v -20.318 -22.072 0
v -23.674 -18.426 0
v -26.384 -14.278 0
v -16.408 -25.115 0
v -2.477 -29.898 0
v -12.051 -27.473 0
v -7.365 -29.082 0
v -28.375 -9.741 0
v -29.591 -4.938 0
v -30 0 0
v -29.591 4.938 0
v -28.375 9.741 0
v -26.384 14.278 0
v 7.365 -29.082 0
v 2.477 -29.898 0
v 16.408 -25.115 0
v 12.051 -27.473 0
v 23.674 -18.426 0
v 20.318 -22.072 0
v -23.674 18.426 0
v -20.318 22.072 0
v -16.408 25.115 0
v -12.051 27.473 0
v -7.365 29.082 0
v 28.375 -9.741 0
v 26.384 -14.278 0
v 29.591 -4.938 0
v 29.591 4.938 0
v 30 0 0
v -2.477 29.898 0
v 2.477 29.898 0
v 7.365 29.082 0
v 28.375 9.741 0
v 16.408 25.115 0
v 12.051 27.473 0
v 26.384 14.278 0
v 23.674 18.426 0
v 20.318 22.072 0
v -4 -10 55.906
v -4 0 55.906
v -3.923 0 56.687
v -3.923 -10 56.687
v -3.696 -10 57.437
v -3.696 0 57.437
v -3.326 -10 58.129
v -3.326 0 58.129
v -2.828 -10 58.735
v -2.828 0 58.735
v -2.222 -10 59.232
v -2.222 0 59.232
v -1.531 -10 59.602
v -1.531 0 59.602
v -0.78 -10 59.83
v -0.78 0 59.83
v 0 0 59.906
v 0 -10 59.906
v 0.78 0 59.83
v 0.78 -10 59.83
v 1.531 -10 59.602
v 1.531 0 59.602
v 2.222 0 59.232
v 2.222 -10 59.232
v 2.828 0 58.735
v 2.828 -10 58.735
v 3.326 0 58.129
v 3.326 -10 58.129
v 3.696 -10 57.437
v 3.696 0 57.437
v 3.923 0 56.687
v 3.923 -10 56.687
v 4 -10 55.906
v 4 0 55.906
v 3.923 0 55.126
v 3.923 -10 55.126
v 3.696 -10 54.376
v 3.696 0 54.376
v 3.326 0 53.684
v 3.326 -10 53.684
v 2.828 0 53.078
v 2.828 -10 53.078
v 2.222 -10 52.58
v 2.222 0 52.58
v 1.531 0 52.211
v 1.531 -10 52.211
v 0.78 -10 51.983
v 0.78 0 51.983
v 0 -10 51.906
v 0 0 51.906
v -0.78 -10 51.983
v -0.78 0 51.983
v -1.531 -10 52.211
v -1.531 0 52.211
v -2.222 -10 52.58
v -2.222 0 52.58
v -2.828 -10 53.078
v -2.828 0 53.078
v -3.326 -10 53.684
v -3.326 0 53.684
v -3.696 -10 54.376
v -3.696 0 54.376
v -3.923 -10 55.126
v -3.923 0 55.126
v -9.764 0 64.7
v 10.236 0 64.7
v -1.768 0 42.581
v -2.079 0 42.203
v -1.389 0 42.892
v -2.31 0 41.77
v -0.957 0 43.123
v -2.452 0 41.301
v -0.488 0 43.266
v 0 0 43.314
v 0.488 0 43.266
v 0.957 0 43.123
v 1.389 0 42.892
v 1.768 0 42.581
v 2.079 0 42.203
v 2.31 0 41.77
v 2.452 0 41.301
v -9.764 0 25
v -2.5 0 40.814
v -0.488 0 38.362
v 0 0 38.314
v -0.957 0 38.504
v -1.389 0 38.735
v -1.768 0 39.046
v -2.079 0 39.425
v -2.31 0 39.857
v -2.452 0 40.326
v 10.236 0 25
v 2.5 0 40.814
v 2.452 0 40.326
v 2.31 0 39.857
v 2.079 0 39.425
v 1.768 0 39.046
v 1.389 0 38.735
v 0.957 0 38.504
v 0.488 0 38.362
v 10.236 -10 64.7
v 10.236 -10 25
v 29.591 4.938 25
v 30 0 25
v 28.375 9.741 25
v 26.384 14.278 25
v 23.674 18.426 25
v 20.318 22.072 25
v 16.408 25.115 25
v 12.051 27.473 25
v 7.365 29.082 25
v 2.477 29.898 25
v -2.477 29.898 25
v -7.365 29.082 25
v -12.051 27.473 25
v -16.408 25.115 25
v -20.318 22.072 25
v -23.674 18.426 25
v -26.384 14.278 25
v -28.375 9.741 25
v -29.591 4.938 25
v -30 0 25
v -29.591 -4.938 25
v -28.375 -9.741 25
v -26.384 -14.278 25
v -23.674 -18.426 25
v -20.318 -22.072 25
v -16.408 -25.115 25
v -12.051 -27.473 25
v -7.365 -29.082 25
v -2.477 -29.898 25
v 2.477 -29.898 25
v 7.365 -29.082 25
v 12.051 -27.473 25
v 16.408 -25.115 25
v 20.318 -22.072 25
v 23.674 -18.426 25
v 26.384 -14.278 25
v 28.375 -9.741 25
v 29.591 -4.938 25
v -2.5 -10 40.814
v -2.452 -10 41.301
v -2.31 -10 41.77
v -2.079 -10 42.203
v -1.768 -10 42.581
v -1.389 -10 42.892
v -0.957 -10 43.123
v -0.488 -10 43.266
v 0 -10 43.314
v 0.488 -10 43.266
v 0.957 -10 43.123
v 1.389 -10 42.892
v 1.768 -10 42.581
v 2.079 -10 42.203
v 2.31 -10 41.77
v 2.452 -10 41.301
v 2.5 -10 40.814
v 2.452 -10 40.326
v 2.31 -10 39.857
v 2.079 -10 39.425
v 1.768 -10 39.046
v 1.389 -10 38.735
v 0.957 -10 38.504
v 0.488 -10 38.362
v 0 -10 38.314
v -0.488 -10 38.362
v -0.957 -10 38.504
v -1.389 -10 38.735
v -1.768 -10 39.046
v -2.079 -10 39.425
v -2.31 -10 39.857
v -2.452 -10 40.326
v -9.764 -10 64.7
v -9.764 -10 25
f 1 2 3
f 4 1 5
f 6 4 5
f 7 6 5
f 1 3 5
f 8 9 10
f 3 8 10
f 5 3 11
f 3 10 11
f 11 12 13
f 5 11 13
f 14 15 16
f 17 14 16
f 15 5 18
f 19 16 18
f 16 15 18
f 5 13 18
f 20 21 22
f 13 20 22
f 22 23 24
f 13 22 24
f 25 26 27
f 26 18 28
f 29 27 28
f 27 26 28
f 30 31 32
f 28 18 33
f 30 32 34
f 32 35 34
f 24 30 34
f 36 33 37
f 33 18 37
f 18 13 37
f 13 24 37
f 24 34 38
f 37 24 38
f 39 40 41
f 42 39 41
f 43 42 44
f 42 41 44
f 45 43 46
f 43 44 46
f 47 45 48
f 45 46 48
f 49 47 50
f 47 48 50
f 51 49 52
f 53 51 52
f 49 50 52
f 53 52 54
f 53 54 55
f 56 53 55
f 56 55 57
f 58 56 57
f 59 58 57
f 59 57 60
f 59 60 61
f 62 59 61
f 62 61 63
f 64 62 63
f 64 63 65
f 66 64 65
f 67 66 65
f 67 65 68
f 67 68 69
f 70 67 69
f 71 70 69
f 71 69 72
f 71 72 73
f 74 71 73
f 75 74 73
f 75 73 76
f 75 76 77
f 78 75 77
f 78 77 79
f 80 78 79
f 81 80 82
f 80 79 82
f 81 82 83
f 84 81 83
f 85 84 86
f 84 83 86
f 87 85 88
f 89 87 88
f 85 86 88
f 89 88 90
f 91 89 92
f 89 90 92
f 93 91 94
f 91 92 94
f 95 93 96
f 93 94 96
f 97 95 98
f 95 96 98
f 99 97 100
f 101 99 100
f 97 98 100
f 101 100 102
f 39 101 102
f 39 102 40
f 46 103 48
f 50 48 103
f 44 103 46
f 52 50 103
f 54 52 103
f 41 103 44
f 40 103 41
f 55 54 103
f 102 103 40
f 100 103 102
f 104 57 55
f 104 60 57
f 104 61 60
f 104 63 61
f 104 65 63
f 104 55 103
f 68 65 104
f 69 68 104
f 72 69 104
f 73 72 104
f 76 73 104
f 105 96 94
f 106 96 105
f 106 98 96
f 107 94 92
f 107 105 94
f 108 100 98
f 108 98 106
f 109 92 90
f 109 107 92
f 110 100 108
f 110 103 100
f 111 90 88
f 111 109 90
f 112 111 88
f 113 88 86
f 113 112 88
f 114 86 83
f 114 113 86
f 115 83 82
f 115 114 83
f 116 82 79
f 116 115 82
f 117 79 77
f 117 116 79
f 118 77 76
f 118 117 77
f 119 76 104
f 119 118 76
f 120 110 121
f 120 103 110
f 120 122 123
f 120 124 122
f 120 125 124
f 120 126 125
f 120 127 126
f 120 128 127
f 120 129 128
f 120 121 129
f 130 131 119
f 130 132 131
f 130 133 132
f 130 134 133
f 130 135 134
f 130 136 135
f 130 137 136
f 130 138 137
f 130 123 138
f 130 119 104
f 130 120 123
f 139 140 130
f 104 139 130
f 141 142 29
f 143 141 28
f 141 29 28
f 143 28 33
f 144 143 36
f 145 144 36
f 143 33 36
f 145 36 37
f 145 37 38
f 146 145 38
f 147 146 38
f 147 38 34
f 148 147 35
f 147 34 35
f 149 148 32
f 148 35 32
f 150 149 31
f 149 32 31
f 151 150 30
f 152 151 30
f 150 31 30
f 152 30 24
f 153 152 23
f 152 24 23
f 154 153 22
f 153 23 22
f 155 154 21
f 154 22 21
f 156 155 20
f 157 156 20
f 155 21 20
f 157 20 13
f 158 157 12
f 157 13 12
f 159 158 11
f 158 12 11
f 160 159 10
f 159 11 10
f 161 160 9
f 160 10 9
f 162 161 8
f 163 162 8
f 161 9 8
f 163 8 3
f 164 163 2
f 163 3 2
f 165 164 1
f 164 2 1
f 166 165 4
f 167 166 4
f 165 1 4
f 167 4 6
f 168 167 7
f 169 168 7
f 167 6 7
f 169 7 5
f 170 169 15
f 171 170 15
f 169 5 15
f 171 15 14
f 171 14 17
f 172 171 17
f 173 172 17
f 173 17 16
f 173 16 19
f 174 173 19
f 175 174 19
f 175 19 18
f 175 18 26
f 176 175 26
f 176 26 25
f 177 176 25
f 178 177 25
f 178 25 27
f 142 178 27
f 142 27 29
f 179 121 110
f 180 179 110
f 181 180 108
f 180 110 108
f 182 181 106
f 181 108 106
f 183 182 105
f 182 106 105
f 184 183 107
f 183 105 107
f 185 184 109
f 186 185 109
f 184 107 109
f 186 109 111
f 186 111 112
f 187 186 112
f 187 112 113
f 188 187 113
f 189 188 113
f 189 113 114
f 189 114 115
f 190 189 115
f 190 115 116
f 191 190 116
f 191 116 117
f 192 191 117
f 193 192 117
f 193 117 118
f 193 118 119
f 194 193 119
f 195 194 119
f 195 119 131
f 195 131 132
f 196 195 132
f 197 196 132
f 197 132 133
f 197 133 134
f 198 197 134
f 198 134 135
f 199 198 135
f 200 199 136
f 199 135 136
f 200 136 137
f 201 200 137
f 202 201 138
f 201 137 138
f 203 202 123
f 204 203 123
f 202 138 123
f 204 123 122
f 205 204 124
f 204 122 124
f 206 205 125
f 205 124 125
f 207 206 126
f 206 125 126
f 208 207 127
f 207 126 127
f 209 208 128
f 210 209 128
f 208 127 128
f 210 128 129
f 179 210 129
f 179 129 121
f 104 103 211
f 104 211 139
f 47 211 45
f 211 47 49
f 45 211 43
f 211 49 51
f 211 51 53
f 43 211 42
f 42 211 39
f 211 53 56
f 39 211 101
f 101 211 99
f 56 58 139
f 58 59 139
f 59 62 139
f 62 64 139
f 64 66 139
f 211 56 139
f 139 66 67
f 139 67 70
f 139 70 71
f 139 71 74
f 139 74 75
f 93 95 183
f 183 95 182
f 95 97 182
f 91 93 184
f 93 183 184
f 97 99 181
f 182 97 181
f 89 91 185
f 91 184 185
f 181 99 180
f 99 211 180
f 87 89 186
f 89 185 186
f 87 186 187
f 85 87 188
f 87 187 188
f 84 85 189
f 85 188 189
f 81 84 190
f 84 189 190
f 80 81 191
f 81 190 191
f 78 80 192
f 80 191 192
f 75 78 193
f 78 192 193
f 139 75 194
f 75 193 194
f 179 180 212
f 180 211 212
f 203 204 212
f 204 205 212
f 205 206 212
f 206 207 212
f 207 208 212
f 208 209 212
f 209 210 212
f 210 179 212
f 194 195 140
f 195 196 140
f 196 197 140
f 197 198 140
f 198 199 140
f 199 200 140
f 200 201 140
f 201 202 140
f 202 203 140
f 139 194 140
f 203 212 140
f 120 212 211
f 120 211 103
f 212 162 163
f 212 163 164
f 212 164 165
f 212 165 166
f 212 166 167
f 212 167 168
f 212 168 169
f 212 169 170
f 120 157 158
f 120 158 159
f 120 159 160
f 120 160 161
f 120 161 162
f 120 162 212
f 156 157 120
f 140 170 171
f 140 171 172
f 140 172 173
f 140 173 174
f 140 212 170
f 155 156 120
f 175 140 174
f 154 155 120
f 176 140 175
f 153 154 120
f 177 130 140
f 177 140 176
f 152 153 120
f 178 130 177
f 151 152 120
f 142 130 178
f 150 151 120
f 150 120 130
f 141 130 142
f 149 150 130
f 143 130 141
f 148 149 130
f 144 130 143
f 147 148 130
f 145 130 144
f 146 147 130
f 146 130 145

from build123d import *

# Parameters (mm, degrees)
F0_R     = 30
F1_DEPTH = 25
F2_W     = 20
F2_H     = 10
F3_DEPTH = 39.7
F4_R     = 4
F5_DEPTH = 41.2
F7_D     = 5


with BuildPart() as f1:
    # F0 (on Top) → F1 (new body)
    with BuildSketch(Plane.XY):
        Circle(F0_R)
    extrude(amount=F1_DEPTH)

    # F2 (on face) → F3 (join)
    with BuildSketch(Plane.XY.offset(25)):
        with Locations((0.236175, -5)):
            Rectangle(F2_W, F2_H)
    extrude(amount=F3_DEPTH)

    # F4 (on face) → F5 (cut)
    with BuildSketch(Plane(origin=(0, 0, 0), x_dir=(-1, 0, 0), z_dir=(0, 1, 0))):
        with Locations((0, 55.906373)):
            Circle(F4_R)
    extrude(amount=-F5_DEPTH, mode=Mode.SUBTRACT)

    # F7 (through all)
    with Locations(Plane.XZ.offset(10)):
        with Locations((0, 40.813621)):
            Hole(F7_D / 2)


solid = f1.part
